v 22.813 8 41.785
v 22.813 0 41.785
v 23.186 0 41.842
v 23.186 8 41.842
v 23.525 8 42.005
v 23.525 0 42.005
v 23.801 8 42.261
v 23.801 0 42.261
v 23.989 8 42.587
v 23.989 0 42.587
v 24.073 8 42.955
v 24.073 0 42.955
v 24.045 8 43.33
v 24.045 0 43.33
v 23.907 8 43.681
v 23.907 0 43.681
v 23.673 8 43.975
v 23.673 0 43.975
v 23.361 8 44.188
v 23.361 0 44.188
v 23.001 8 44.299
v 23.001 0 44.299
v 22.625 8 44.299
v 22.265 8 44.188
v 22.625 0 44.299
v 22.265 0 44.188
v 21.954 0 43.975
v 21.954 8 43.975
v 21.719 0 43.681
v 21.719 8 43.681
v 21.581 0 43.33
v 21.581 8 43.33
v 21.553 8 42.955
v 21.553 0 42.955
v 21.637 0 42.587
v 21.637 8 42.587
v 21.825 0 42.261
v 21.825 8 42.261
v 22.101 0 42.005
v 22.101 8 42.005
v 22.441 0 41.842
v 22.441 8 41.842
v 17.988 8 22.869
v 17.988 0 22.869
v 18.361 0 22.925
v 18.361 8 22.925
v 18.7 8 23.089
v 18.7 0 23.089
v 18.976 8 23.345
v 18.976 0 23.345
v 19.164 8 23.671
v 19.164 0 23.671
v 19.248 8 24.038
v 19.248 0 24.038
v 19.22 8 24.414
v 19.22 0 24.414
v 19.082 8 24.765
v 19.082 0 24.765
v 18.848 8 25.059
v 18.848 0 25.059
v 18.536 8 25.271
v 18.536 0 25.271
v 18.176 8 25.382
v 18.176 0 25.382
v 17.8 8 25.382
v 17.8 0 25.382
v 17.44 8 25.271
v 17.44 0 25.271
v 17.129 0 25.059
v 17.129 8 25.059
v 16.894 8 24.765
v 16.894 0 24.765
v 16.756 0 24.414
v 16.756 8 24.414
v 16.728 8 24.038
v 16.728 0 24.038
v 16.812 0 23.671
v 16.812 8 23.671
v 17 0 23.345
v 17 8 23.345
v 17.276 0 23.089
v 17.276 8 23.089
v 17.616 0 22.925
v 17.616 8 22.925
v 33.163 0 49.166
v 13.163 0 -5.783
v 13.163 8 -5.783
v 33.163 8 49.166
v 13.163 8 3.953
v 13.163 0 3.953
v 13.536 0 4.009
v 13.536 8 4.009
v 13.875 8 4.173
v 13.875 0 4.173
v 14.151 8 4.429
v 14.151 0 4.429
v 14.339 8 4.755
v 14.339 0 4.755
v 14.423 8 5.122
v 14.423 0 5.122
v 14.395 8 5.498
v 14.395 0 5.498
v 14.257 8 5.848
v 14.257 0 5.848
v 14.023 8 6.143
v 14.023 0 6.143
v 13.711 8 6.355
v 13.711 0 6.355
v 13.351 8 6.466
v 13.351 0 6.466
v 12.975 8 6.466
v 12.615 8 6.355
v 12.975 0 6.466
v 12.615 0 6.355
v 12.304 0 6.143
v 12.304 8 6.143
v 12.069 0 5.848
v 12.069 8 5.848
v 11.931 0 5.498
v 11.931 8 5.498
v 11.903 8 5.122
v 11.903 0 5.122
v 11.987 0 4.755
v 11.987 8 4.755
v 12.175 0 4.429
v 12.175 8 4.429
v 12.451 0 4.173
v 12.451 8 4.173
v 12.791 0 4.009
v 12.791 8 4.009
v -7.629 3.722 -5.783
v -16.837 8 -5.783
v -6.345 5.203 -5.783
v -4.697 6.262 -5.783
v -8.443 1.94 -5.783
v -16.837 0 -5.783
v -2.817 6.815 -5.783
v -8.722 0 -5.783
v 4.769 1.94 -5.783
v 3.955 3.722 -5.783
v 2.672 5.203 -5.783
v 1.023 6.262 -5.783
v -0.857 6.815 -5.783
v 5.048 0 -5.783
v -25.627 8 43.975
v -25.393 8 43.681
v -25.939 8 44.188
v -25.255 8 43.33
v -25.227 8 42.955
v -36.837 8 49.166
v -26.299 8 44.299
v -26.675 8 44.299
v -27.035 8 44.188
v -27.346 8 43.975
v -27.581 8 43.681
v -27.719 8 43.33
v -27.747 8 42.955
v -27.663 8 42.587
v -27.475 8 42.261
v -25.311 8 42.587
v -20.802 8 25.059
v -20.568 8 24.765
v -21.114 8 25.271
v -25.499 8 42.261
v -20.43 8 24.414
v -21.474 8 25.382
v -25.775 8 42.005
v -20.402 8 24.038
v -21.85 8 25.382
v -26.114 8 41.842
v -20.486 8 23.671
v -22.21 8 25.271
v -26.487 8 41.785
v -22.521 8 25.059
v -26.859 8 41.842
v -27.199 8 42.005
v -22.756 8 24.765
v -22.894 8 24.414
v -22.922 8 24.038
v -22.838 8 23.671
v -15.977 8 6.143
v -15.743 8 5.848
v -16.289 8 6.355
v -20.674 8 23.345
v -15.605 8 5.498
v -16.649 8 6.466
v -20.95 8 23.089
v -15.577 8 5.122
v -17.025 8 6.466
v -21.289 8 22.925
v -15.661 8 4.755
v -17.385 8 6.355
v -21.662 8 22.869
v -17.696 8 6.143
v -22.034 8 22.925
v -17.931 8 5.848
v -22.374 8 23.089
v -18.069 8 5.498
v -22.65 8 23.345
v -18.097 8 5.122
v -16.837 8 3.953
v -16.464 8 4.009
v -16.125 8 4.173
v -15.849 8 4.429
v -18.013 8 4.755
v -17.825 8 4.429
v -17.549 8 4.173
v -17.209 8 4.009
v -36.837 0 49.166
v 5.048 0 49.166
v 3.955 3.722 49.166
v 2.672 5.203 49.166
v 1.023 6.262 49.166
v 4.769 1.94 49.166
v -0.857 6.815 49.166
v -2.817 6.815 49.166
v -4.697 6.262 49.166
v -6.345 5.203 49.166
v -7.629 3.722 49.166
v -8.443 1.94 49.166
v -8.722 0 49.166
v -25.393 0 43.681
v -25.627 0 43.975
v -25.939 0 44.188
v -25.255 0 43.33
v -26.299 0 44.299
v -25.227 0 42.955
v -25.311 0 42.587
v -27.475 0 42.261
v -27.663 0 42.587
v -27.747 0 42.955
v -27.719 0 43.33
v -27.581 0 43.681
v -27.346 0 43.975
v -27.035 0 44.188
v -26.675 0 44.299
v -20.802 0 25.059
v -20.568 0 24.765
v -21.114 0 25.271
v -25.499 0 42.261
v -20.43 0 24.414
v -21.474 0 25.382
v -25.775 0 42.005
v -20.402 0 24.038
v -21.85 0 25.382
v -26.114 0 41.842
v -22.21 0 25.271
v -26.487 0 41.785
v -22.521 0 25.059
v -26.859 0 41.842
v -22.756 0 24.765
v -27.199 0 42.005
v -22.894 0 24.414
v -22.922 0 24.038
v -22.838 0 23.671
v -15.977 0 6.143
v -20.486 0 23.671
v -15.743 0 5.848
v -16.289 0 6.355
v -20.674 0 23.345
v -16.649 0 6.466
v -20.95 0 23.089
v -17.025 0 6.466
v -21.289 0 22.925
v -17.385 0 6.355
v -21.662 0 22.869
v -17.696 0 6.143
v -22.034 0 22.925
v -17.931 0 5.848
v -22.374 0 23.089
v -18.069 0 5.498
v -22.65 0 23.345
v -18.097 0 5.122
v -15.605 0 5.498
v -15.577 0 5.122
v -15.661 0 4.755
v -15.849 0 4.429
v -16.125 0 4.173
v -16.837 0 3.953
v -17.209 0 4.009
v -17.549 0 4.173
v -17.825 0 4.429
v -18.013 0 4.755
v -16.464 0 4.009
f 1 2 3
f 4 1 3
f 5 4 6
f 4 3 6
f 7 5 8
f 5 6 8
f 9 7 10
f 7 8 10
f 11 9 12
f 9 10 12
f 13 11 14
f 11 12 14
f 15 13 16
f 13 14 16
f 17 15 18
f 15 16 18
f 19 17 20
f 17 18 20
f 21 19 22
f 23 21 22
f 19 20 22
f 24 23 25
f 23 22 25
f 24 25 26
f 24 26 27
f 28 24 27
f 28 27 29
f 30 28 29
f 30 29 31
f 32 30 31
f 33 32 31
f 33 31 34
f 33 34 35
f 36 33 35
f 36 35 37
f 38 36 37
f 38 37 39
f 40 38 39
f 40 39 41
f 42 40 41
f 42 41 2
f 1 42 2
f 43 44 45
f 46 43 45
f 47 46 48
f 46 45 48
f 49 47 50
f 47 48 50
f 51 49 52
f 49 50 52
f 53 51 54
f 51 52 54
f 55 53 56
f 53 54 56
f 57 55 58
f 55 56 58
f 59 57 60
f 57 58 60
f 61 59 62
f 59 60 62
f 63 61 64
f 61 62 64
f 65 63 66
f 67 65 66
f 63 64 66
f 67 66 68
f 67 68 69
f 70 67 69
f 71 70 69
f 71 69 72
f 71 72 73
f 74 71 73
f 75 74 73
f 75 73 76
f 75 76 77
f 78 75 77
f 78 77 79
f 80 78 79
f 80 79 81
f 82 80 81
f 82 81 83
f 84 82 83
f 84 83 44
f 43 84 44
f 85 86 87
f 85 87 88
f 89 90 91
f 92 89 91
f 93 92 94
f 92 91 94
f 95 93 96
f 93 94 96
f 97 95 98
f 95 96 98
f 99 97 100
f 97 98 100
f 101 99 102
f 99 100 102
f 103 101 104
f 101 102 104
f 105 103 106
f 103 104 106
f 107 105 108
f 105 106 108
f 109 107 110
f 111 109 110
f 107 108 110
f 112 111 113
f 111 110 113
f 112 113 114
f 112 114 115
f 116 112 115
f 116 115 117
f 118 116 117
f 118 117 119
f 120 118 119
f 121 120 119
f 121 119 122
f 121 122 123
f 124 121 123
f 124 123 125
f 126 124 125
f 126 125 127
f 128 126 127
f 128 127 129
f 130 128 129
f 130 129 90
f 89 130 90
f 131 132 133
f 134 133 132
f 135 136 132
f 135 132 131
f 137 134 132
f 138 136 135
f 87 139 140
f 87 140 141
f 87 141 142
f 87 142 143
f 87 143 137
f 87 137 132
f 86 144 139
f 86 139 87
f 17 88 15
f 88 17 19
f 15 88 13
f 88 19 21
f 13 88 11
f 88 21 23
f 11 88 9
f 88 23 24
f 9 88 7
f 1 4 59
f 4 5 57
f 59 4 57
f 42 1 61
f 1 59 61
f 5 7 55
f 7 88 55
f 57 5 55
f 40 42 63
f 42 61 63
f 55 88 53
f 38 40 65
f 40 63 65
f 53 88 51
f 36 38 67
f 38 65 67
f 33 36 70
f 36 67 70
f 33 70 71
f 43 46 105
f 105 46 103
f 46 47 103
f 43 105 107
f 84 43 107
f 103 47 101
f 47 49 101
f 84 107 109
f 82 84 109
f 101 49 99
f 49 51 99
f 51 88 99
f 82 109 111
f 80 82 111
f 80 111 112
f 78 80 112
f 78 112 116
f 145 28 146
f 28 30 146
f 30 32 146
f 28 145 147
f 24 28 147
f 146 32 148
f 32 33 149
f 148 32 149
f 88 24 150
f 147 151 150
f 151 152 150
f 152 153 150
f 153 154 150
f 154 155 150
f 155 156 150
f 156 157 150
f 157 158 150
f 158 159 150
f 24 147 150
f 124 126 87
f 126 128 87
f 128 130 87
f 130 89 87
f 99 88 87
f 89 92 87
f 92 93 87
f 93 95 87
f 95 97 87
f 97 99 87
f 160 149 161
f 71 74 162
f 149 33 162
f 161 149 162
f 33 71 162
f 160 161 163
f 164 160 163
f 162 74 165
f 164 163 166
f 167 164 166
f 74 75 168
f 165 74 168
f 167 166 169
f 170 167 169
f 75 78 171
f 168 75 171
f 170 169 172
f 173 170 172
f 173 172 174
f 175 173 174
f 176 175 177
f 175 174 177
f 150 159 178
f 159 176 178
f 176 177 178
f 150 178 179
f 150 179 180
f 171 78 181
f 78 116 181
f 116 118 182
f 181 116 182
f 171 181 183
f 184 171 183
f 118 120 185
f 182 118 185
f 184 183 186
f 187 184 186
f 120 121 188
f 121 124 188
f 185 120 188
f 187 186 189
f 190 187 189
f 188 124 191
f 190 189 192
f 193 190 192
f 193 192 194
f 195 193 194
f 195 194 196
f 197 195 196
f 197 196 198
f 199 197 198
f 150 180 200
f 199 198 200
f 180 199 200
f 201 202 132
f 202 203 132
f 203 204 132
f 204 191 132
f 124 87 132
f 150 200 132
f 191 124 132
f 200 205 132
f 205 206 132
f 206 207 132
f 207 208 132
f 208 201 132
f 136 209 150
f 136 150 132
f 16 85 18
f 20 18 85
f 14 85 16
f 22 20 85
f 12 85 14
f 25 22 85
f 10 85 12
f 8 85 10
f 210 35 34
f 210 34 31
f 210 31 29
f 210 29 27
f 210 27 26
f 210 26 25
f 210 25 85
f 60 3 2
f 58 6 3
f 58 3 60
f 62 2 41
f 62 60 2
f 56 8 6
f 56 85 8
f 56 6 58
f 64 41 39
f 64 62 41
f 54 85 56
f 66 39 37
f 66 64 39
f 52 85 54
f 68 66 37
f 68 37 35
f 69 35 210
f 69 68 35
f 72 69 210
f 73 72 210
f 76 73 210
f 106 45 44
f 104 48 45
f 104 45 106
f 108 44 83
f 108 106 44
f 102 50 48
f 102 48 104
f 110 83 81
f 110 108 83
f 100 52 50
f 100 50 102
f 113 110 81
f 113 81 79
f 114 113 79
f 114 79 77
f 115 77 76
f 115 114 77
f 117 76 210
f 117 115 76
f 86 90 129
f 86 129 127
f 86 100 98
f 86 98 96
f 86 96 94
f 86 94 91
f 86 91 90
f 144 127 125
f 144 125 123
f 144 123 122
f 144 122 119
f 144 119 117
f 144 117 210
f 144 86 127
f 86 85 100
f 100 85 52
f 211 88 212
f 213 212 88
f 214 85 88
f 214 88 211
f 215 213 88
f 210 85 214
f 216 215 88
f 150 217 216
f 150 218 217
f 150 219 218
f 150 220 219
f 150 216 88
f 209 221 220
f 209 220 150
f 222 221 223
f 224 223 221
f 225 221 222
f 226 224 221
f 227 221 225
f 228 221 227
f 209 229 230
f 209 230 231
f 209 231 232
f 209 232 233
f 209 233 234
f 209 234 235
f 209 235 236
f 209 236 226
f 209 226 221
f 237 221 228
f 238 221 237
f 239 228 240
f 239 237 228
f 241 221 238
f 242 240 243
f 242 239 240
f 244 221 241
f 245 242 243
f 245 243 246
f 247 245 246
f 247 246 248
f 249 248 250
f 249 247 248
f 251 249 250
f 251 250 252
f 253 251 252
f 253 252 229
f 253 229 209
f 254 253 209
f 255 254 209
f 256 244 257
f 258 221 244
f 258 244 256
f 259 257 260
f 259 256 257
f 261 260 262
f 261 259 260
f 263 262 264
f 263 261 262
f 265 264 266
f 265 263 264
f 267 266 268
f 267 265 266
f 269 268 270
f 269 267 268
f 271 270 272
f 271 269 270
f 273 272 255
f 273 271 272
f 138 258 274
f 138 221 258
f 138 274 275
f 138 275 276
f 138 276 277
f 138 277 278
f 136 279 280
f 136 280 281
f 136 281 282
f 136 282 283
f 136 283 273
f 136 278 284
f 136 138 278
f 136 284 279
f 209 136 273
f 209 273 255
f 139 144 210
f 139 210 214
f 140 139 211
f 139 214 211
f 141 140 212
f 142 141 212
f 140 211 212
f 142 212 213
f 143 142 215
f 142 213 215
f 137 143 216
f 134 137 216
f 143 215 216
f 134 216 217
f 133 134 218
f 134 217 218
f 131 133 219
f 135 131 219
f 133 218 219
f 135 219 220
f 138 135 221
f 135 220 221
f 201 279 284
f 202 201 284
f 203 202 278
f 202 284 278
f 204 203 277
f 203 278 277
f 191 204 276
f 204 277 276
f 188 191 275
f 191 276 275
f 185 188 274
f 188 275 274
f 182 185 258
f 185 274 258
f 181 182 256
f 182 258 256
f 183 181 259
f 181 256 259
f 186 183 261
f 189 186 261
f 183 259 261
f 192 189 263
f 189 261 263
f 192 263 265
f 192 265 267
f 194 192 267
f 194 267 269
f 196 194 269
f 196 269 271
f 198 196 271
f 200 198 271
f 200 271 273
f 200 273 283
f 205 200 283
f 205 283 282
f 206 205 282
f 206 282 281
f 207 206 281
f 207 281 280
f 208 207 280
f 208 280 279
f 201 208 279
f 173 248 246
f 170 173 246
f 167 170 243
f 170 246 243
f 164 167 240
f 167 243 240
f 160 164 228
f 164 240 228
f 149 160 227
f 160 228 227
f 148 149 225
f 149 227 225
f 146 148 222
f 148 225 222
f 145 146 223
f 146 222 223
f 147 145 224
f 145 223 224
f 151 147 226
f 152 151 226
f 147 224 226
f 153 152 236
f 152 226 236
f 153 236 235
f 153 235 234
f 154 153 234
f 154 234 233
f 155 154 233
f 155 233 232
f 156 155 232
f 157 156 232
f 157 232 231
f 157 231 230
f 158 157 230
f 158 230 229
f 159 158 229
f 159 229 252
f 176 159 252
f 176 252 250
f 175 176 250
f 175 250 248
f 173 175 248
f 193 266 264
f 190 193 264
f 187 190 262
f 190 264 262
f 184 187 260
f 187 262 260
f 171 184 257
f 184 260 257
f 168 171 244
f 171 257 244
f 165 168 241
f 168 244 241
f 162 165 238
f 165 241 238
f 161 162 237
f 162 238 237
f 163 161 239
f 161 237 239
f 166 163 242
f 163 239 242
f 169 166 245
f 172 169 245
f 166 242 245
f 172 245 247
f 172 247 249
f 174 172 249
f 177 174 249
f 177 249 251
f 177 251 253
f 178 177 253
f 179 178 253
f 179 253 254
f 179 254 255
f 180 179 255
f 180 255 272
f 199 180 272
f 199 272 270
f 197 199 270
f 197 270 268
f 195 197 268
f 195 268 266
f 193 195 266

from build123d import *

# Parameters (mm, degrees)
BOSS_EXTRUDE3_DEPTH                    = 8
SKETCH8_R                              = 6.884606738
CUT_EXTRUDE3_DEPTH                     = 88
F_39_0_0995_DIAMETER_HOLE1_D           = 2.5273
F_39_0_0995_DIAMETER_HOLE1_ON_FACE_2_D = 2.5273


with BuildPart() as part:
    # Sketch6 → Boss-Extrude3 (new body)
    with BuildSketch(Plane(origin=(0, 0, 0), x_dir=(1, 0, 0), z_dir=(0, 1, 0))):
        Polygon((-16.836914056, 5.783353512), (13.163085944, 5.783353512), (33.163085944, -49.166194877), (-36.836914056, -49.166194877), align=None)
    extrude(amount=BOSS_EXTRUDE3_DEPTH)

    # Sketch8 → Cut-Extrude3 (cut)
    with BuildSketch(Plane.XY.offset(49.166194877)):
        with Locations((-1.836914056, 0)):
            Circle(SKETCH8_R)
    extrude(amount=-CUT_EXTRUDE3_DEPTH, mode=Mode.SUBTRACT)

    # #39 (0.0995) Diameter Hole1 (through all)
    with Locations(Plane(origin=(17.988085944, 8, 24.13287332), x_dir=(0, 0, 1), z_dir=(0, 1, 0))):
        with Locations((0, 0), (18.916226832, 4.825), (18.916226832, -44.475), (-18.916226832, -34.825), (-18.916226832, -4.825), (0, -39.65)):
            Hole(F_39_0_0995_DIAMETER_HOLE1_D / 2)

    # #39 (0.0995) Diameter Hole1 on face 2 (through all)
    with Locations(Plane(origin=(-16.836914056, 0, 5.216646488), x_dir=(0, 0, -1), z_dir=(0, -1, 0))):
        with Locations((0, 0), (0, 30), (-37.832453664, 39.65), (-37.832453664, -9.65)):
            Hole(F_39_0_0995_DIAMETER_HOLE1_ON_FACE_2_D / 2)


solid = part.part
